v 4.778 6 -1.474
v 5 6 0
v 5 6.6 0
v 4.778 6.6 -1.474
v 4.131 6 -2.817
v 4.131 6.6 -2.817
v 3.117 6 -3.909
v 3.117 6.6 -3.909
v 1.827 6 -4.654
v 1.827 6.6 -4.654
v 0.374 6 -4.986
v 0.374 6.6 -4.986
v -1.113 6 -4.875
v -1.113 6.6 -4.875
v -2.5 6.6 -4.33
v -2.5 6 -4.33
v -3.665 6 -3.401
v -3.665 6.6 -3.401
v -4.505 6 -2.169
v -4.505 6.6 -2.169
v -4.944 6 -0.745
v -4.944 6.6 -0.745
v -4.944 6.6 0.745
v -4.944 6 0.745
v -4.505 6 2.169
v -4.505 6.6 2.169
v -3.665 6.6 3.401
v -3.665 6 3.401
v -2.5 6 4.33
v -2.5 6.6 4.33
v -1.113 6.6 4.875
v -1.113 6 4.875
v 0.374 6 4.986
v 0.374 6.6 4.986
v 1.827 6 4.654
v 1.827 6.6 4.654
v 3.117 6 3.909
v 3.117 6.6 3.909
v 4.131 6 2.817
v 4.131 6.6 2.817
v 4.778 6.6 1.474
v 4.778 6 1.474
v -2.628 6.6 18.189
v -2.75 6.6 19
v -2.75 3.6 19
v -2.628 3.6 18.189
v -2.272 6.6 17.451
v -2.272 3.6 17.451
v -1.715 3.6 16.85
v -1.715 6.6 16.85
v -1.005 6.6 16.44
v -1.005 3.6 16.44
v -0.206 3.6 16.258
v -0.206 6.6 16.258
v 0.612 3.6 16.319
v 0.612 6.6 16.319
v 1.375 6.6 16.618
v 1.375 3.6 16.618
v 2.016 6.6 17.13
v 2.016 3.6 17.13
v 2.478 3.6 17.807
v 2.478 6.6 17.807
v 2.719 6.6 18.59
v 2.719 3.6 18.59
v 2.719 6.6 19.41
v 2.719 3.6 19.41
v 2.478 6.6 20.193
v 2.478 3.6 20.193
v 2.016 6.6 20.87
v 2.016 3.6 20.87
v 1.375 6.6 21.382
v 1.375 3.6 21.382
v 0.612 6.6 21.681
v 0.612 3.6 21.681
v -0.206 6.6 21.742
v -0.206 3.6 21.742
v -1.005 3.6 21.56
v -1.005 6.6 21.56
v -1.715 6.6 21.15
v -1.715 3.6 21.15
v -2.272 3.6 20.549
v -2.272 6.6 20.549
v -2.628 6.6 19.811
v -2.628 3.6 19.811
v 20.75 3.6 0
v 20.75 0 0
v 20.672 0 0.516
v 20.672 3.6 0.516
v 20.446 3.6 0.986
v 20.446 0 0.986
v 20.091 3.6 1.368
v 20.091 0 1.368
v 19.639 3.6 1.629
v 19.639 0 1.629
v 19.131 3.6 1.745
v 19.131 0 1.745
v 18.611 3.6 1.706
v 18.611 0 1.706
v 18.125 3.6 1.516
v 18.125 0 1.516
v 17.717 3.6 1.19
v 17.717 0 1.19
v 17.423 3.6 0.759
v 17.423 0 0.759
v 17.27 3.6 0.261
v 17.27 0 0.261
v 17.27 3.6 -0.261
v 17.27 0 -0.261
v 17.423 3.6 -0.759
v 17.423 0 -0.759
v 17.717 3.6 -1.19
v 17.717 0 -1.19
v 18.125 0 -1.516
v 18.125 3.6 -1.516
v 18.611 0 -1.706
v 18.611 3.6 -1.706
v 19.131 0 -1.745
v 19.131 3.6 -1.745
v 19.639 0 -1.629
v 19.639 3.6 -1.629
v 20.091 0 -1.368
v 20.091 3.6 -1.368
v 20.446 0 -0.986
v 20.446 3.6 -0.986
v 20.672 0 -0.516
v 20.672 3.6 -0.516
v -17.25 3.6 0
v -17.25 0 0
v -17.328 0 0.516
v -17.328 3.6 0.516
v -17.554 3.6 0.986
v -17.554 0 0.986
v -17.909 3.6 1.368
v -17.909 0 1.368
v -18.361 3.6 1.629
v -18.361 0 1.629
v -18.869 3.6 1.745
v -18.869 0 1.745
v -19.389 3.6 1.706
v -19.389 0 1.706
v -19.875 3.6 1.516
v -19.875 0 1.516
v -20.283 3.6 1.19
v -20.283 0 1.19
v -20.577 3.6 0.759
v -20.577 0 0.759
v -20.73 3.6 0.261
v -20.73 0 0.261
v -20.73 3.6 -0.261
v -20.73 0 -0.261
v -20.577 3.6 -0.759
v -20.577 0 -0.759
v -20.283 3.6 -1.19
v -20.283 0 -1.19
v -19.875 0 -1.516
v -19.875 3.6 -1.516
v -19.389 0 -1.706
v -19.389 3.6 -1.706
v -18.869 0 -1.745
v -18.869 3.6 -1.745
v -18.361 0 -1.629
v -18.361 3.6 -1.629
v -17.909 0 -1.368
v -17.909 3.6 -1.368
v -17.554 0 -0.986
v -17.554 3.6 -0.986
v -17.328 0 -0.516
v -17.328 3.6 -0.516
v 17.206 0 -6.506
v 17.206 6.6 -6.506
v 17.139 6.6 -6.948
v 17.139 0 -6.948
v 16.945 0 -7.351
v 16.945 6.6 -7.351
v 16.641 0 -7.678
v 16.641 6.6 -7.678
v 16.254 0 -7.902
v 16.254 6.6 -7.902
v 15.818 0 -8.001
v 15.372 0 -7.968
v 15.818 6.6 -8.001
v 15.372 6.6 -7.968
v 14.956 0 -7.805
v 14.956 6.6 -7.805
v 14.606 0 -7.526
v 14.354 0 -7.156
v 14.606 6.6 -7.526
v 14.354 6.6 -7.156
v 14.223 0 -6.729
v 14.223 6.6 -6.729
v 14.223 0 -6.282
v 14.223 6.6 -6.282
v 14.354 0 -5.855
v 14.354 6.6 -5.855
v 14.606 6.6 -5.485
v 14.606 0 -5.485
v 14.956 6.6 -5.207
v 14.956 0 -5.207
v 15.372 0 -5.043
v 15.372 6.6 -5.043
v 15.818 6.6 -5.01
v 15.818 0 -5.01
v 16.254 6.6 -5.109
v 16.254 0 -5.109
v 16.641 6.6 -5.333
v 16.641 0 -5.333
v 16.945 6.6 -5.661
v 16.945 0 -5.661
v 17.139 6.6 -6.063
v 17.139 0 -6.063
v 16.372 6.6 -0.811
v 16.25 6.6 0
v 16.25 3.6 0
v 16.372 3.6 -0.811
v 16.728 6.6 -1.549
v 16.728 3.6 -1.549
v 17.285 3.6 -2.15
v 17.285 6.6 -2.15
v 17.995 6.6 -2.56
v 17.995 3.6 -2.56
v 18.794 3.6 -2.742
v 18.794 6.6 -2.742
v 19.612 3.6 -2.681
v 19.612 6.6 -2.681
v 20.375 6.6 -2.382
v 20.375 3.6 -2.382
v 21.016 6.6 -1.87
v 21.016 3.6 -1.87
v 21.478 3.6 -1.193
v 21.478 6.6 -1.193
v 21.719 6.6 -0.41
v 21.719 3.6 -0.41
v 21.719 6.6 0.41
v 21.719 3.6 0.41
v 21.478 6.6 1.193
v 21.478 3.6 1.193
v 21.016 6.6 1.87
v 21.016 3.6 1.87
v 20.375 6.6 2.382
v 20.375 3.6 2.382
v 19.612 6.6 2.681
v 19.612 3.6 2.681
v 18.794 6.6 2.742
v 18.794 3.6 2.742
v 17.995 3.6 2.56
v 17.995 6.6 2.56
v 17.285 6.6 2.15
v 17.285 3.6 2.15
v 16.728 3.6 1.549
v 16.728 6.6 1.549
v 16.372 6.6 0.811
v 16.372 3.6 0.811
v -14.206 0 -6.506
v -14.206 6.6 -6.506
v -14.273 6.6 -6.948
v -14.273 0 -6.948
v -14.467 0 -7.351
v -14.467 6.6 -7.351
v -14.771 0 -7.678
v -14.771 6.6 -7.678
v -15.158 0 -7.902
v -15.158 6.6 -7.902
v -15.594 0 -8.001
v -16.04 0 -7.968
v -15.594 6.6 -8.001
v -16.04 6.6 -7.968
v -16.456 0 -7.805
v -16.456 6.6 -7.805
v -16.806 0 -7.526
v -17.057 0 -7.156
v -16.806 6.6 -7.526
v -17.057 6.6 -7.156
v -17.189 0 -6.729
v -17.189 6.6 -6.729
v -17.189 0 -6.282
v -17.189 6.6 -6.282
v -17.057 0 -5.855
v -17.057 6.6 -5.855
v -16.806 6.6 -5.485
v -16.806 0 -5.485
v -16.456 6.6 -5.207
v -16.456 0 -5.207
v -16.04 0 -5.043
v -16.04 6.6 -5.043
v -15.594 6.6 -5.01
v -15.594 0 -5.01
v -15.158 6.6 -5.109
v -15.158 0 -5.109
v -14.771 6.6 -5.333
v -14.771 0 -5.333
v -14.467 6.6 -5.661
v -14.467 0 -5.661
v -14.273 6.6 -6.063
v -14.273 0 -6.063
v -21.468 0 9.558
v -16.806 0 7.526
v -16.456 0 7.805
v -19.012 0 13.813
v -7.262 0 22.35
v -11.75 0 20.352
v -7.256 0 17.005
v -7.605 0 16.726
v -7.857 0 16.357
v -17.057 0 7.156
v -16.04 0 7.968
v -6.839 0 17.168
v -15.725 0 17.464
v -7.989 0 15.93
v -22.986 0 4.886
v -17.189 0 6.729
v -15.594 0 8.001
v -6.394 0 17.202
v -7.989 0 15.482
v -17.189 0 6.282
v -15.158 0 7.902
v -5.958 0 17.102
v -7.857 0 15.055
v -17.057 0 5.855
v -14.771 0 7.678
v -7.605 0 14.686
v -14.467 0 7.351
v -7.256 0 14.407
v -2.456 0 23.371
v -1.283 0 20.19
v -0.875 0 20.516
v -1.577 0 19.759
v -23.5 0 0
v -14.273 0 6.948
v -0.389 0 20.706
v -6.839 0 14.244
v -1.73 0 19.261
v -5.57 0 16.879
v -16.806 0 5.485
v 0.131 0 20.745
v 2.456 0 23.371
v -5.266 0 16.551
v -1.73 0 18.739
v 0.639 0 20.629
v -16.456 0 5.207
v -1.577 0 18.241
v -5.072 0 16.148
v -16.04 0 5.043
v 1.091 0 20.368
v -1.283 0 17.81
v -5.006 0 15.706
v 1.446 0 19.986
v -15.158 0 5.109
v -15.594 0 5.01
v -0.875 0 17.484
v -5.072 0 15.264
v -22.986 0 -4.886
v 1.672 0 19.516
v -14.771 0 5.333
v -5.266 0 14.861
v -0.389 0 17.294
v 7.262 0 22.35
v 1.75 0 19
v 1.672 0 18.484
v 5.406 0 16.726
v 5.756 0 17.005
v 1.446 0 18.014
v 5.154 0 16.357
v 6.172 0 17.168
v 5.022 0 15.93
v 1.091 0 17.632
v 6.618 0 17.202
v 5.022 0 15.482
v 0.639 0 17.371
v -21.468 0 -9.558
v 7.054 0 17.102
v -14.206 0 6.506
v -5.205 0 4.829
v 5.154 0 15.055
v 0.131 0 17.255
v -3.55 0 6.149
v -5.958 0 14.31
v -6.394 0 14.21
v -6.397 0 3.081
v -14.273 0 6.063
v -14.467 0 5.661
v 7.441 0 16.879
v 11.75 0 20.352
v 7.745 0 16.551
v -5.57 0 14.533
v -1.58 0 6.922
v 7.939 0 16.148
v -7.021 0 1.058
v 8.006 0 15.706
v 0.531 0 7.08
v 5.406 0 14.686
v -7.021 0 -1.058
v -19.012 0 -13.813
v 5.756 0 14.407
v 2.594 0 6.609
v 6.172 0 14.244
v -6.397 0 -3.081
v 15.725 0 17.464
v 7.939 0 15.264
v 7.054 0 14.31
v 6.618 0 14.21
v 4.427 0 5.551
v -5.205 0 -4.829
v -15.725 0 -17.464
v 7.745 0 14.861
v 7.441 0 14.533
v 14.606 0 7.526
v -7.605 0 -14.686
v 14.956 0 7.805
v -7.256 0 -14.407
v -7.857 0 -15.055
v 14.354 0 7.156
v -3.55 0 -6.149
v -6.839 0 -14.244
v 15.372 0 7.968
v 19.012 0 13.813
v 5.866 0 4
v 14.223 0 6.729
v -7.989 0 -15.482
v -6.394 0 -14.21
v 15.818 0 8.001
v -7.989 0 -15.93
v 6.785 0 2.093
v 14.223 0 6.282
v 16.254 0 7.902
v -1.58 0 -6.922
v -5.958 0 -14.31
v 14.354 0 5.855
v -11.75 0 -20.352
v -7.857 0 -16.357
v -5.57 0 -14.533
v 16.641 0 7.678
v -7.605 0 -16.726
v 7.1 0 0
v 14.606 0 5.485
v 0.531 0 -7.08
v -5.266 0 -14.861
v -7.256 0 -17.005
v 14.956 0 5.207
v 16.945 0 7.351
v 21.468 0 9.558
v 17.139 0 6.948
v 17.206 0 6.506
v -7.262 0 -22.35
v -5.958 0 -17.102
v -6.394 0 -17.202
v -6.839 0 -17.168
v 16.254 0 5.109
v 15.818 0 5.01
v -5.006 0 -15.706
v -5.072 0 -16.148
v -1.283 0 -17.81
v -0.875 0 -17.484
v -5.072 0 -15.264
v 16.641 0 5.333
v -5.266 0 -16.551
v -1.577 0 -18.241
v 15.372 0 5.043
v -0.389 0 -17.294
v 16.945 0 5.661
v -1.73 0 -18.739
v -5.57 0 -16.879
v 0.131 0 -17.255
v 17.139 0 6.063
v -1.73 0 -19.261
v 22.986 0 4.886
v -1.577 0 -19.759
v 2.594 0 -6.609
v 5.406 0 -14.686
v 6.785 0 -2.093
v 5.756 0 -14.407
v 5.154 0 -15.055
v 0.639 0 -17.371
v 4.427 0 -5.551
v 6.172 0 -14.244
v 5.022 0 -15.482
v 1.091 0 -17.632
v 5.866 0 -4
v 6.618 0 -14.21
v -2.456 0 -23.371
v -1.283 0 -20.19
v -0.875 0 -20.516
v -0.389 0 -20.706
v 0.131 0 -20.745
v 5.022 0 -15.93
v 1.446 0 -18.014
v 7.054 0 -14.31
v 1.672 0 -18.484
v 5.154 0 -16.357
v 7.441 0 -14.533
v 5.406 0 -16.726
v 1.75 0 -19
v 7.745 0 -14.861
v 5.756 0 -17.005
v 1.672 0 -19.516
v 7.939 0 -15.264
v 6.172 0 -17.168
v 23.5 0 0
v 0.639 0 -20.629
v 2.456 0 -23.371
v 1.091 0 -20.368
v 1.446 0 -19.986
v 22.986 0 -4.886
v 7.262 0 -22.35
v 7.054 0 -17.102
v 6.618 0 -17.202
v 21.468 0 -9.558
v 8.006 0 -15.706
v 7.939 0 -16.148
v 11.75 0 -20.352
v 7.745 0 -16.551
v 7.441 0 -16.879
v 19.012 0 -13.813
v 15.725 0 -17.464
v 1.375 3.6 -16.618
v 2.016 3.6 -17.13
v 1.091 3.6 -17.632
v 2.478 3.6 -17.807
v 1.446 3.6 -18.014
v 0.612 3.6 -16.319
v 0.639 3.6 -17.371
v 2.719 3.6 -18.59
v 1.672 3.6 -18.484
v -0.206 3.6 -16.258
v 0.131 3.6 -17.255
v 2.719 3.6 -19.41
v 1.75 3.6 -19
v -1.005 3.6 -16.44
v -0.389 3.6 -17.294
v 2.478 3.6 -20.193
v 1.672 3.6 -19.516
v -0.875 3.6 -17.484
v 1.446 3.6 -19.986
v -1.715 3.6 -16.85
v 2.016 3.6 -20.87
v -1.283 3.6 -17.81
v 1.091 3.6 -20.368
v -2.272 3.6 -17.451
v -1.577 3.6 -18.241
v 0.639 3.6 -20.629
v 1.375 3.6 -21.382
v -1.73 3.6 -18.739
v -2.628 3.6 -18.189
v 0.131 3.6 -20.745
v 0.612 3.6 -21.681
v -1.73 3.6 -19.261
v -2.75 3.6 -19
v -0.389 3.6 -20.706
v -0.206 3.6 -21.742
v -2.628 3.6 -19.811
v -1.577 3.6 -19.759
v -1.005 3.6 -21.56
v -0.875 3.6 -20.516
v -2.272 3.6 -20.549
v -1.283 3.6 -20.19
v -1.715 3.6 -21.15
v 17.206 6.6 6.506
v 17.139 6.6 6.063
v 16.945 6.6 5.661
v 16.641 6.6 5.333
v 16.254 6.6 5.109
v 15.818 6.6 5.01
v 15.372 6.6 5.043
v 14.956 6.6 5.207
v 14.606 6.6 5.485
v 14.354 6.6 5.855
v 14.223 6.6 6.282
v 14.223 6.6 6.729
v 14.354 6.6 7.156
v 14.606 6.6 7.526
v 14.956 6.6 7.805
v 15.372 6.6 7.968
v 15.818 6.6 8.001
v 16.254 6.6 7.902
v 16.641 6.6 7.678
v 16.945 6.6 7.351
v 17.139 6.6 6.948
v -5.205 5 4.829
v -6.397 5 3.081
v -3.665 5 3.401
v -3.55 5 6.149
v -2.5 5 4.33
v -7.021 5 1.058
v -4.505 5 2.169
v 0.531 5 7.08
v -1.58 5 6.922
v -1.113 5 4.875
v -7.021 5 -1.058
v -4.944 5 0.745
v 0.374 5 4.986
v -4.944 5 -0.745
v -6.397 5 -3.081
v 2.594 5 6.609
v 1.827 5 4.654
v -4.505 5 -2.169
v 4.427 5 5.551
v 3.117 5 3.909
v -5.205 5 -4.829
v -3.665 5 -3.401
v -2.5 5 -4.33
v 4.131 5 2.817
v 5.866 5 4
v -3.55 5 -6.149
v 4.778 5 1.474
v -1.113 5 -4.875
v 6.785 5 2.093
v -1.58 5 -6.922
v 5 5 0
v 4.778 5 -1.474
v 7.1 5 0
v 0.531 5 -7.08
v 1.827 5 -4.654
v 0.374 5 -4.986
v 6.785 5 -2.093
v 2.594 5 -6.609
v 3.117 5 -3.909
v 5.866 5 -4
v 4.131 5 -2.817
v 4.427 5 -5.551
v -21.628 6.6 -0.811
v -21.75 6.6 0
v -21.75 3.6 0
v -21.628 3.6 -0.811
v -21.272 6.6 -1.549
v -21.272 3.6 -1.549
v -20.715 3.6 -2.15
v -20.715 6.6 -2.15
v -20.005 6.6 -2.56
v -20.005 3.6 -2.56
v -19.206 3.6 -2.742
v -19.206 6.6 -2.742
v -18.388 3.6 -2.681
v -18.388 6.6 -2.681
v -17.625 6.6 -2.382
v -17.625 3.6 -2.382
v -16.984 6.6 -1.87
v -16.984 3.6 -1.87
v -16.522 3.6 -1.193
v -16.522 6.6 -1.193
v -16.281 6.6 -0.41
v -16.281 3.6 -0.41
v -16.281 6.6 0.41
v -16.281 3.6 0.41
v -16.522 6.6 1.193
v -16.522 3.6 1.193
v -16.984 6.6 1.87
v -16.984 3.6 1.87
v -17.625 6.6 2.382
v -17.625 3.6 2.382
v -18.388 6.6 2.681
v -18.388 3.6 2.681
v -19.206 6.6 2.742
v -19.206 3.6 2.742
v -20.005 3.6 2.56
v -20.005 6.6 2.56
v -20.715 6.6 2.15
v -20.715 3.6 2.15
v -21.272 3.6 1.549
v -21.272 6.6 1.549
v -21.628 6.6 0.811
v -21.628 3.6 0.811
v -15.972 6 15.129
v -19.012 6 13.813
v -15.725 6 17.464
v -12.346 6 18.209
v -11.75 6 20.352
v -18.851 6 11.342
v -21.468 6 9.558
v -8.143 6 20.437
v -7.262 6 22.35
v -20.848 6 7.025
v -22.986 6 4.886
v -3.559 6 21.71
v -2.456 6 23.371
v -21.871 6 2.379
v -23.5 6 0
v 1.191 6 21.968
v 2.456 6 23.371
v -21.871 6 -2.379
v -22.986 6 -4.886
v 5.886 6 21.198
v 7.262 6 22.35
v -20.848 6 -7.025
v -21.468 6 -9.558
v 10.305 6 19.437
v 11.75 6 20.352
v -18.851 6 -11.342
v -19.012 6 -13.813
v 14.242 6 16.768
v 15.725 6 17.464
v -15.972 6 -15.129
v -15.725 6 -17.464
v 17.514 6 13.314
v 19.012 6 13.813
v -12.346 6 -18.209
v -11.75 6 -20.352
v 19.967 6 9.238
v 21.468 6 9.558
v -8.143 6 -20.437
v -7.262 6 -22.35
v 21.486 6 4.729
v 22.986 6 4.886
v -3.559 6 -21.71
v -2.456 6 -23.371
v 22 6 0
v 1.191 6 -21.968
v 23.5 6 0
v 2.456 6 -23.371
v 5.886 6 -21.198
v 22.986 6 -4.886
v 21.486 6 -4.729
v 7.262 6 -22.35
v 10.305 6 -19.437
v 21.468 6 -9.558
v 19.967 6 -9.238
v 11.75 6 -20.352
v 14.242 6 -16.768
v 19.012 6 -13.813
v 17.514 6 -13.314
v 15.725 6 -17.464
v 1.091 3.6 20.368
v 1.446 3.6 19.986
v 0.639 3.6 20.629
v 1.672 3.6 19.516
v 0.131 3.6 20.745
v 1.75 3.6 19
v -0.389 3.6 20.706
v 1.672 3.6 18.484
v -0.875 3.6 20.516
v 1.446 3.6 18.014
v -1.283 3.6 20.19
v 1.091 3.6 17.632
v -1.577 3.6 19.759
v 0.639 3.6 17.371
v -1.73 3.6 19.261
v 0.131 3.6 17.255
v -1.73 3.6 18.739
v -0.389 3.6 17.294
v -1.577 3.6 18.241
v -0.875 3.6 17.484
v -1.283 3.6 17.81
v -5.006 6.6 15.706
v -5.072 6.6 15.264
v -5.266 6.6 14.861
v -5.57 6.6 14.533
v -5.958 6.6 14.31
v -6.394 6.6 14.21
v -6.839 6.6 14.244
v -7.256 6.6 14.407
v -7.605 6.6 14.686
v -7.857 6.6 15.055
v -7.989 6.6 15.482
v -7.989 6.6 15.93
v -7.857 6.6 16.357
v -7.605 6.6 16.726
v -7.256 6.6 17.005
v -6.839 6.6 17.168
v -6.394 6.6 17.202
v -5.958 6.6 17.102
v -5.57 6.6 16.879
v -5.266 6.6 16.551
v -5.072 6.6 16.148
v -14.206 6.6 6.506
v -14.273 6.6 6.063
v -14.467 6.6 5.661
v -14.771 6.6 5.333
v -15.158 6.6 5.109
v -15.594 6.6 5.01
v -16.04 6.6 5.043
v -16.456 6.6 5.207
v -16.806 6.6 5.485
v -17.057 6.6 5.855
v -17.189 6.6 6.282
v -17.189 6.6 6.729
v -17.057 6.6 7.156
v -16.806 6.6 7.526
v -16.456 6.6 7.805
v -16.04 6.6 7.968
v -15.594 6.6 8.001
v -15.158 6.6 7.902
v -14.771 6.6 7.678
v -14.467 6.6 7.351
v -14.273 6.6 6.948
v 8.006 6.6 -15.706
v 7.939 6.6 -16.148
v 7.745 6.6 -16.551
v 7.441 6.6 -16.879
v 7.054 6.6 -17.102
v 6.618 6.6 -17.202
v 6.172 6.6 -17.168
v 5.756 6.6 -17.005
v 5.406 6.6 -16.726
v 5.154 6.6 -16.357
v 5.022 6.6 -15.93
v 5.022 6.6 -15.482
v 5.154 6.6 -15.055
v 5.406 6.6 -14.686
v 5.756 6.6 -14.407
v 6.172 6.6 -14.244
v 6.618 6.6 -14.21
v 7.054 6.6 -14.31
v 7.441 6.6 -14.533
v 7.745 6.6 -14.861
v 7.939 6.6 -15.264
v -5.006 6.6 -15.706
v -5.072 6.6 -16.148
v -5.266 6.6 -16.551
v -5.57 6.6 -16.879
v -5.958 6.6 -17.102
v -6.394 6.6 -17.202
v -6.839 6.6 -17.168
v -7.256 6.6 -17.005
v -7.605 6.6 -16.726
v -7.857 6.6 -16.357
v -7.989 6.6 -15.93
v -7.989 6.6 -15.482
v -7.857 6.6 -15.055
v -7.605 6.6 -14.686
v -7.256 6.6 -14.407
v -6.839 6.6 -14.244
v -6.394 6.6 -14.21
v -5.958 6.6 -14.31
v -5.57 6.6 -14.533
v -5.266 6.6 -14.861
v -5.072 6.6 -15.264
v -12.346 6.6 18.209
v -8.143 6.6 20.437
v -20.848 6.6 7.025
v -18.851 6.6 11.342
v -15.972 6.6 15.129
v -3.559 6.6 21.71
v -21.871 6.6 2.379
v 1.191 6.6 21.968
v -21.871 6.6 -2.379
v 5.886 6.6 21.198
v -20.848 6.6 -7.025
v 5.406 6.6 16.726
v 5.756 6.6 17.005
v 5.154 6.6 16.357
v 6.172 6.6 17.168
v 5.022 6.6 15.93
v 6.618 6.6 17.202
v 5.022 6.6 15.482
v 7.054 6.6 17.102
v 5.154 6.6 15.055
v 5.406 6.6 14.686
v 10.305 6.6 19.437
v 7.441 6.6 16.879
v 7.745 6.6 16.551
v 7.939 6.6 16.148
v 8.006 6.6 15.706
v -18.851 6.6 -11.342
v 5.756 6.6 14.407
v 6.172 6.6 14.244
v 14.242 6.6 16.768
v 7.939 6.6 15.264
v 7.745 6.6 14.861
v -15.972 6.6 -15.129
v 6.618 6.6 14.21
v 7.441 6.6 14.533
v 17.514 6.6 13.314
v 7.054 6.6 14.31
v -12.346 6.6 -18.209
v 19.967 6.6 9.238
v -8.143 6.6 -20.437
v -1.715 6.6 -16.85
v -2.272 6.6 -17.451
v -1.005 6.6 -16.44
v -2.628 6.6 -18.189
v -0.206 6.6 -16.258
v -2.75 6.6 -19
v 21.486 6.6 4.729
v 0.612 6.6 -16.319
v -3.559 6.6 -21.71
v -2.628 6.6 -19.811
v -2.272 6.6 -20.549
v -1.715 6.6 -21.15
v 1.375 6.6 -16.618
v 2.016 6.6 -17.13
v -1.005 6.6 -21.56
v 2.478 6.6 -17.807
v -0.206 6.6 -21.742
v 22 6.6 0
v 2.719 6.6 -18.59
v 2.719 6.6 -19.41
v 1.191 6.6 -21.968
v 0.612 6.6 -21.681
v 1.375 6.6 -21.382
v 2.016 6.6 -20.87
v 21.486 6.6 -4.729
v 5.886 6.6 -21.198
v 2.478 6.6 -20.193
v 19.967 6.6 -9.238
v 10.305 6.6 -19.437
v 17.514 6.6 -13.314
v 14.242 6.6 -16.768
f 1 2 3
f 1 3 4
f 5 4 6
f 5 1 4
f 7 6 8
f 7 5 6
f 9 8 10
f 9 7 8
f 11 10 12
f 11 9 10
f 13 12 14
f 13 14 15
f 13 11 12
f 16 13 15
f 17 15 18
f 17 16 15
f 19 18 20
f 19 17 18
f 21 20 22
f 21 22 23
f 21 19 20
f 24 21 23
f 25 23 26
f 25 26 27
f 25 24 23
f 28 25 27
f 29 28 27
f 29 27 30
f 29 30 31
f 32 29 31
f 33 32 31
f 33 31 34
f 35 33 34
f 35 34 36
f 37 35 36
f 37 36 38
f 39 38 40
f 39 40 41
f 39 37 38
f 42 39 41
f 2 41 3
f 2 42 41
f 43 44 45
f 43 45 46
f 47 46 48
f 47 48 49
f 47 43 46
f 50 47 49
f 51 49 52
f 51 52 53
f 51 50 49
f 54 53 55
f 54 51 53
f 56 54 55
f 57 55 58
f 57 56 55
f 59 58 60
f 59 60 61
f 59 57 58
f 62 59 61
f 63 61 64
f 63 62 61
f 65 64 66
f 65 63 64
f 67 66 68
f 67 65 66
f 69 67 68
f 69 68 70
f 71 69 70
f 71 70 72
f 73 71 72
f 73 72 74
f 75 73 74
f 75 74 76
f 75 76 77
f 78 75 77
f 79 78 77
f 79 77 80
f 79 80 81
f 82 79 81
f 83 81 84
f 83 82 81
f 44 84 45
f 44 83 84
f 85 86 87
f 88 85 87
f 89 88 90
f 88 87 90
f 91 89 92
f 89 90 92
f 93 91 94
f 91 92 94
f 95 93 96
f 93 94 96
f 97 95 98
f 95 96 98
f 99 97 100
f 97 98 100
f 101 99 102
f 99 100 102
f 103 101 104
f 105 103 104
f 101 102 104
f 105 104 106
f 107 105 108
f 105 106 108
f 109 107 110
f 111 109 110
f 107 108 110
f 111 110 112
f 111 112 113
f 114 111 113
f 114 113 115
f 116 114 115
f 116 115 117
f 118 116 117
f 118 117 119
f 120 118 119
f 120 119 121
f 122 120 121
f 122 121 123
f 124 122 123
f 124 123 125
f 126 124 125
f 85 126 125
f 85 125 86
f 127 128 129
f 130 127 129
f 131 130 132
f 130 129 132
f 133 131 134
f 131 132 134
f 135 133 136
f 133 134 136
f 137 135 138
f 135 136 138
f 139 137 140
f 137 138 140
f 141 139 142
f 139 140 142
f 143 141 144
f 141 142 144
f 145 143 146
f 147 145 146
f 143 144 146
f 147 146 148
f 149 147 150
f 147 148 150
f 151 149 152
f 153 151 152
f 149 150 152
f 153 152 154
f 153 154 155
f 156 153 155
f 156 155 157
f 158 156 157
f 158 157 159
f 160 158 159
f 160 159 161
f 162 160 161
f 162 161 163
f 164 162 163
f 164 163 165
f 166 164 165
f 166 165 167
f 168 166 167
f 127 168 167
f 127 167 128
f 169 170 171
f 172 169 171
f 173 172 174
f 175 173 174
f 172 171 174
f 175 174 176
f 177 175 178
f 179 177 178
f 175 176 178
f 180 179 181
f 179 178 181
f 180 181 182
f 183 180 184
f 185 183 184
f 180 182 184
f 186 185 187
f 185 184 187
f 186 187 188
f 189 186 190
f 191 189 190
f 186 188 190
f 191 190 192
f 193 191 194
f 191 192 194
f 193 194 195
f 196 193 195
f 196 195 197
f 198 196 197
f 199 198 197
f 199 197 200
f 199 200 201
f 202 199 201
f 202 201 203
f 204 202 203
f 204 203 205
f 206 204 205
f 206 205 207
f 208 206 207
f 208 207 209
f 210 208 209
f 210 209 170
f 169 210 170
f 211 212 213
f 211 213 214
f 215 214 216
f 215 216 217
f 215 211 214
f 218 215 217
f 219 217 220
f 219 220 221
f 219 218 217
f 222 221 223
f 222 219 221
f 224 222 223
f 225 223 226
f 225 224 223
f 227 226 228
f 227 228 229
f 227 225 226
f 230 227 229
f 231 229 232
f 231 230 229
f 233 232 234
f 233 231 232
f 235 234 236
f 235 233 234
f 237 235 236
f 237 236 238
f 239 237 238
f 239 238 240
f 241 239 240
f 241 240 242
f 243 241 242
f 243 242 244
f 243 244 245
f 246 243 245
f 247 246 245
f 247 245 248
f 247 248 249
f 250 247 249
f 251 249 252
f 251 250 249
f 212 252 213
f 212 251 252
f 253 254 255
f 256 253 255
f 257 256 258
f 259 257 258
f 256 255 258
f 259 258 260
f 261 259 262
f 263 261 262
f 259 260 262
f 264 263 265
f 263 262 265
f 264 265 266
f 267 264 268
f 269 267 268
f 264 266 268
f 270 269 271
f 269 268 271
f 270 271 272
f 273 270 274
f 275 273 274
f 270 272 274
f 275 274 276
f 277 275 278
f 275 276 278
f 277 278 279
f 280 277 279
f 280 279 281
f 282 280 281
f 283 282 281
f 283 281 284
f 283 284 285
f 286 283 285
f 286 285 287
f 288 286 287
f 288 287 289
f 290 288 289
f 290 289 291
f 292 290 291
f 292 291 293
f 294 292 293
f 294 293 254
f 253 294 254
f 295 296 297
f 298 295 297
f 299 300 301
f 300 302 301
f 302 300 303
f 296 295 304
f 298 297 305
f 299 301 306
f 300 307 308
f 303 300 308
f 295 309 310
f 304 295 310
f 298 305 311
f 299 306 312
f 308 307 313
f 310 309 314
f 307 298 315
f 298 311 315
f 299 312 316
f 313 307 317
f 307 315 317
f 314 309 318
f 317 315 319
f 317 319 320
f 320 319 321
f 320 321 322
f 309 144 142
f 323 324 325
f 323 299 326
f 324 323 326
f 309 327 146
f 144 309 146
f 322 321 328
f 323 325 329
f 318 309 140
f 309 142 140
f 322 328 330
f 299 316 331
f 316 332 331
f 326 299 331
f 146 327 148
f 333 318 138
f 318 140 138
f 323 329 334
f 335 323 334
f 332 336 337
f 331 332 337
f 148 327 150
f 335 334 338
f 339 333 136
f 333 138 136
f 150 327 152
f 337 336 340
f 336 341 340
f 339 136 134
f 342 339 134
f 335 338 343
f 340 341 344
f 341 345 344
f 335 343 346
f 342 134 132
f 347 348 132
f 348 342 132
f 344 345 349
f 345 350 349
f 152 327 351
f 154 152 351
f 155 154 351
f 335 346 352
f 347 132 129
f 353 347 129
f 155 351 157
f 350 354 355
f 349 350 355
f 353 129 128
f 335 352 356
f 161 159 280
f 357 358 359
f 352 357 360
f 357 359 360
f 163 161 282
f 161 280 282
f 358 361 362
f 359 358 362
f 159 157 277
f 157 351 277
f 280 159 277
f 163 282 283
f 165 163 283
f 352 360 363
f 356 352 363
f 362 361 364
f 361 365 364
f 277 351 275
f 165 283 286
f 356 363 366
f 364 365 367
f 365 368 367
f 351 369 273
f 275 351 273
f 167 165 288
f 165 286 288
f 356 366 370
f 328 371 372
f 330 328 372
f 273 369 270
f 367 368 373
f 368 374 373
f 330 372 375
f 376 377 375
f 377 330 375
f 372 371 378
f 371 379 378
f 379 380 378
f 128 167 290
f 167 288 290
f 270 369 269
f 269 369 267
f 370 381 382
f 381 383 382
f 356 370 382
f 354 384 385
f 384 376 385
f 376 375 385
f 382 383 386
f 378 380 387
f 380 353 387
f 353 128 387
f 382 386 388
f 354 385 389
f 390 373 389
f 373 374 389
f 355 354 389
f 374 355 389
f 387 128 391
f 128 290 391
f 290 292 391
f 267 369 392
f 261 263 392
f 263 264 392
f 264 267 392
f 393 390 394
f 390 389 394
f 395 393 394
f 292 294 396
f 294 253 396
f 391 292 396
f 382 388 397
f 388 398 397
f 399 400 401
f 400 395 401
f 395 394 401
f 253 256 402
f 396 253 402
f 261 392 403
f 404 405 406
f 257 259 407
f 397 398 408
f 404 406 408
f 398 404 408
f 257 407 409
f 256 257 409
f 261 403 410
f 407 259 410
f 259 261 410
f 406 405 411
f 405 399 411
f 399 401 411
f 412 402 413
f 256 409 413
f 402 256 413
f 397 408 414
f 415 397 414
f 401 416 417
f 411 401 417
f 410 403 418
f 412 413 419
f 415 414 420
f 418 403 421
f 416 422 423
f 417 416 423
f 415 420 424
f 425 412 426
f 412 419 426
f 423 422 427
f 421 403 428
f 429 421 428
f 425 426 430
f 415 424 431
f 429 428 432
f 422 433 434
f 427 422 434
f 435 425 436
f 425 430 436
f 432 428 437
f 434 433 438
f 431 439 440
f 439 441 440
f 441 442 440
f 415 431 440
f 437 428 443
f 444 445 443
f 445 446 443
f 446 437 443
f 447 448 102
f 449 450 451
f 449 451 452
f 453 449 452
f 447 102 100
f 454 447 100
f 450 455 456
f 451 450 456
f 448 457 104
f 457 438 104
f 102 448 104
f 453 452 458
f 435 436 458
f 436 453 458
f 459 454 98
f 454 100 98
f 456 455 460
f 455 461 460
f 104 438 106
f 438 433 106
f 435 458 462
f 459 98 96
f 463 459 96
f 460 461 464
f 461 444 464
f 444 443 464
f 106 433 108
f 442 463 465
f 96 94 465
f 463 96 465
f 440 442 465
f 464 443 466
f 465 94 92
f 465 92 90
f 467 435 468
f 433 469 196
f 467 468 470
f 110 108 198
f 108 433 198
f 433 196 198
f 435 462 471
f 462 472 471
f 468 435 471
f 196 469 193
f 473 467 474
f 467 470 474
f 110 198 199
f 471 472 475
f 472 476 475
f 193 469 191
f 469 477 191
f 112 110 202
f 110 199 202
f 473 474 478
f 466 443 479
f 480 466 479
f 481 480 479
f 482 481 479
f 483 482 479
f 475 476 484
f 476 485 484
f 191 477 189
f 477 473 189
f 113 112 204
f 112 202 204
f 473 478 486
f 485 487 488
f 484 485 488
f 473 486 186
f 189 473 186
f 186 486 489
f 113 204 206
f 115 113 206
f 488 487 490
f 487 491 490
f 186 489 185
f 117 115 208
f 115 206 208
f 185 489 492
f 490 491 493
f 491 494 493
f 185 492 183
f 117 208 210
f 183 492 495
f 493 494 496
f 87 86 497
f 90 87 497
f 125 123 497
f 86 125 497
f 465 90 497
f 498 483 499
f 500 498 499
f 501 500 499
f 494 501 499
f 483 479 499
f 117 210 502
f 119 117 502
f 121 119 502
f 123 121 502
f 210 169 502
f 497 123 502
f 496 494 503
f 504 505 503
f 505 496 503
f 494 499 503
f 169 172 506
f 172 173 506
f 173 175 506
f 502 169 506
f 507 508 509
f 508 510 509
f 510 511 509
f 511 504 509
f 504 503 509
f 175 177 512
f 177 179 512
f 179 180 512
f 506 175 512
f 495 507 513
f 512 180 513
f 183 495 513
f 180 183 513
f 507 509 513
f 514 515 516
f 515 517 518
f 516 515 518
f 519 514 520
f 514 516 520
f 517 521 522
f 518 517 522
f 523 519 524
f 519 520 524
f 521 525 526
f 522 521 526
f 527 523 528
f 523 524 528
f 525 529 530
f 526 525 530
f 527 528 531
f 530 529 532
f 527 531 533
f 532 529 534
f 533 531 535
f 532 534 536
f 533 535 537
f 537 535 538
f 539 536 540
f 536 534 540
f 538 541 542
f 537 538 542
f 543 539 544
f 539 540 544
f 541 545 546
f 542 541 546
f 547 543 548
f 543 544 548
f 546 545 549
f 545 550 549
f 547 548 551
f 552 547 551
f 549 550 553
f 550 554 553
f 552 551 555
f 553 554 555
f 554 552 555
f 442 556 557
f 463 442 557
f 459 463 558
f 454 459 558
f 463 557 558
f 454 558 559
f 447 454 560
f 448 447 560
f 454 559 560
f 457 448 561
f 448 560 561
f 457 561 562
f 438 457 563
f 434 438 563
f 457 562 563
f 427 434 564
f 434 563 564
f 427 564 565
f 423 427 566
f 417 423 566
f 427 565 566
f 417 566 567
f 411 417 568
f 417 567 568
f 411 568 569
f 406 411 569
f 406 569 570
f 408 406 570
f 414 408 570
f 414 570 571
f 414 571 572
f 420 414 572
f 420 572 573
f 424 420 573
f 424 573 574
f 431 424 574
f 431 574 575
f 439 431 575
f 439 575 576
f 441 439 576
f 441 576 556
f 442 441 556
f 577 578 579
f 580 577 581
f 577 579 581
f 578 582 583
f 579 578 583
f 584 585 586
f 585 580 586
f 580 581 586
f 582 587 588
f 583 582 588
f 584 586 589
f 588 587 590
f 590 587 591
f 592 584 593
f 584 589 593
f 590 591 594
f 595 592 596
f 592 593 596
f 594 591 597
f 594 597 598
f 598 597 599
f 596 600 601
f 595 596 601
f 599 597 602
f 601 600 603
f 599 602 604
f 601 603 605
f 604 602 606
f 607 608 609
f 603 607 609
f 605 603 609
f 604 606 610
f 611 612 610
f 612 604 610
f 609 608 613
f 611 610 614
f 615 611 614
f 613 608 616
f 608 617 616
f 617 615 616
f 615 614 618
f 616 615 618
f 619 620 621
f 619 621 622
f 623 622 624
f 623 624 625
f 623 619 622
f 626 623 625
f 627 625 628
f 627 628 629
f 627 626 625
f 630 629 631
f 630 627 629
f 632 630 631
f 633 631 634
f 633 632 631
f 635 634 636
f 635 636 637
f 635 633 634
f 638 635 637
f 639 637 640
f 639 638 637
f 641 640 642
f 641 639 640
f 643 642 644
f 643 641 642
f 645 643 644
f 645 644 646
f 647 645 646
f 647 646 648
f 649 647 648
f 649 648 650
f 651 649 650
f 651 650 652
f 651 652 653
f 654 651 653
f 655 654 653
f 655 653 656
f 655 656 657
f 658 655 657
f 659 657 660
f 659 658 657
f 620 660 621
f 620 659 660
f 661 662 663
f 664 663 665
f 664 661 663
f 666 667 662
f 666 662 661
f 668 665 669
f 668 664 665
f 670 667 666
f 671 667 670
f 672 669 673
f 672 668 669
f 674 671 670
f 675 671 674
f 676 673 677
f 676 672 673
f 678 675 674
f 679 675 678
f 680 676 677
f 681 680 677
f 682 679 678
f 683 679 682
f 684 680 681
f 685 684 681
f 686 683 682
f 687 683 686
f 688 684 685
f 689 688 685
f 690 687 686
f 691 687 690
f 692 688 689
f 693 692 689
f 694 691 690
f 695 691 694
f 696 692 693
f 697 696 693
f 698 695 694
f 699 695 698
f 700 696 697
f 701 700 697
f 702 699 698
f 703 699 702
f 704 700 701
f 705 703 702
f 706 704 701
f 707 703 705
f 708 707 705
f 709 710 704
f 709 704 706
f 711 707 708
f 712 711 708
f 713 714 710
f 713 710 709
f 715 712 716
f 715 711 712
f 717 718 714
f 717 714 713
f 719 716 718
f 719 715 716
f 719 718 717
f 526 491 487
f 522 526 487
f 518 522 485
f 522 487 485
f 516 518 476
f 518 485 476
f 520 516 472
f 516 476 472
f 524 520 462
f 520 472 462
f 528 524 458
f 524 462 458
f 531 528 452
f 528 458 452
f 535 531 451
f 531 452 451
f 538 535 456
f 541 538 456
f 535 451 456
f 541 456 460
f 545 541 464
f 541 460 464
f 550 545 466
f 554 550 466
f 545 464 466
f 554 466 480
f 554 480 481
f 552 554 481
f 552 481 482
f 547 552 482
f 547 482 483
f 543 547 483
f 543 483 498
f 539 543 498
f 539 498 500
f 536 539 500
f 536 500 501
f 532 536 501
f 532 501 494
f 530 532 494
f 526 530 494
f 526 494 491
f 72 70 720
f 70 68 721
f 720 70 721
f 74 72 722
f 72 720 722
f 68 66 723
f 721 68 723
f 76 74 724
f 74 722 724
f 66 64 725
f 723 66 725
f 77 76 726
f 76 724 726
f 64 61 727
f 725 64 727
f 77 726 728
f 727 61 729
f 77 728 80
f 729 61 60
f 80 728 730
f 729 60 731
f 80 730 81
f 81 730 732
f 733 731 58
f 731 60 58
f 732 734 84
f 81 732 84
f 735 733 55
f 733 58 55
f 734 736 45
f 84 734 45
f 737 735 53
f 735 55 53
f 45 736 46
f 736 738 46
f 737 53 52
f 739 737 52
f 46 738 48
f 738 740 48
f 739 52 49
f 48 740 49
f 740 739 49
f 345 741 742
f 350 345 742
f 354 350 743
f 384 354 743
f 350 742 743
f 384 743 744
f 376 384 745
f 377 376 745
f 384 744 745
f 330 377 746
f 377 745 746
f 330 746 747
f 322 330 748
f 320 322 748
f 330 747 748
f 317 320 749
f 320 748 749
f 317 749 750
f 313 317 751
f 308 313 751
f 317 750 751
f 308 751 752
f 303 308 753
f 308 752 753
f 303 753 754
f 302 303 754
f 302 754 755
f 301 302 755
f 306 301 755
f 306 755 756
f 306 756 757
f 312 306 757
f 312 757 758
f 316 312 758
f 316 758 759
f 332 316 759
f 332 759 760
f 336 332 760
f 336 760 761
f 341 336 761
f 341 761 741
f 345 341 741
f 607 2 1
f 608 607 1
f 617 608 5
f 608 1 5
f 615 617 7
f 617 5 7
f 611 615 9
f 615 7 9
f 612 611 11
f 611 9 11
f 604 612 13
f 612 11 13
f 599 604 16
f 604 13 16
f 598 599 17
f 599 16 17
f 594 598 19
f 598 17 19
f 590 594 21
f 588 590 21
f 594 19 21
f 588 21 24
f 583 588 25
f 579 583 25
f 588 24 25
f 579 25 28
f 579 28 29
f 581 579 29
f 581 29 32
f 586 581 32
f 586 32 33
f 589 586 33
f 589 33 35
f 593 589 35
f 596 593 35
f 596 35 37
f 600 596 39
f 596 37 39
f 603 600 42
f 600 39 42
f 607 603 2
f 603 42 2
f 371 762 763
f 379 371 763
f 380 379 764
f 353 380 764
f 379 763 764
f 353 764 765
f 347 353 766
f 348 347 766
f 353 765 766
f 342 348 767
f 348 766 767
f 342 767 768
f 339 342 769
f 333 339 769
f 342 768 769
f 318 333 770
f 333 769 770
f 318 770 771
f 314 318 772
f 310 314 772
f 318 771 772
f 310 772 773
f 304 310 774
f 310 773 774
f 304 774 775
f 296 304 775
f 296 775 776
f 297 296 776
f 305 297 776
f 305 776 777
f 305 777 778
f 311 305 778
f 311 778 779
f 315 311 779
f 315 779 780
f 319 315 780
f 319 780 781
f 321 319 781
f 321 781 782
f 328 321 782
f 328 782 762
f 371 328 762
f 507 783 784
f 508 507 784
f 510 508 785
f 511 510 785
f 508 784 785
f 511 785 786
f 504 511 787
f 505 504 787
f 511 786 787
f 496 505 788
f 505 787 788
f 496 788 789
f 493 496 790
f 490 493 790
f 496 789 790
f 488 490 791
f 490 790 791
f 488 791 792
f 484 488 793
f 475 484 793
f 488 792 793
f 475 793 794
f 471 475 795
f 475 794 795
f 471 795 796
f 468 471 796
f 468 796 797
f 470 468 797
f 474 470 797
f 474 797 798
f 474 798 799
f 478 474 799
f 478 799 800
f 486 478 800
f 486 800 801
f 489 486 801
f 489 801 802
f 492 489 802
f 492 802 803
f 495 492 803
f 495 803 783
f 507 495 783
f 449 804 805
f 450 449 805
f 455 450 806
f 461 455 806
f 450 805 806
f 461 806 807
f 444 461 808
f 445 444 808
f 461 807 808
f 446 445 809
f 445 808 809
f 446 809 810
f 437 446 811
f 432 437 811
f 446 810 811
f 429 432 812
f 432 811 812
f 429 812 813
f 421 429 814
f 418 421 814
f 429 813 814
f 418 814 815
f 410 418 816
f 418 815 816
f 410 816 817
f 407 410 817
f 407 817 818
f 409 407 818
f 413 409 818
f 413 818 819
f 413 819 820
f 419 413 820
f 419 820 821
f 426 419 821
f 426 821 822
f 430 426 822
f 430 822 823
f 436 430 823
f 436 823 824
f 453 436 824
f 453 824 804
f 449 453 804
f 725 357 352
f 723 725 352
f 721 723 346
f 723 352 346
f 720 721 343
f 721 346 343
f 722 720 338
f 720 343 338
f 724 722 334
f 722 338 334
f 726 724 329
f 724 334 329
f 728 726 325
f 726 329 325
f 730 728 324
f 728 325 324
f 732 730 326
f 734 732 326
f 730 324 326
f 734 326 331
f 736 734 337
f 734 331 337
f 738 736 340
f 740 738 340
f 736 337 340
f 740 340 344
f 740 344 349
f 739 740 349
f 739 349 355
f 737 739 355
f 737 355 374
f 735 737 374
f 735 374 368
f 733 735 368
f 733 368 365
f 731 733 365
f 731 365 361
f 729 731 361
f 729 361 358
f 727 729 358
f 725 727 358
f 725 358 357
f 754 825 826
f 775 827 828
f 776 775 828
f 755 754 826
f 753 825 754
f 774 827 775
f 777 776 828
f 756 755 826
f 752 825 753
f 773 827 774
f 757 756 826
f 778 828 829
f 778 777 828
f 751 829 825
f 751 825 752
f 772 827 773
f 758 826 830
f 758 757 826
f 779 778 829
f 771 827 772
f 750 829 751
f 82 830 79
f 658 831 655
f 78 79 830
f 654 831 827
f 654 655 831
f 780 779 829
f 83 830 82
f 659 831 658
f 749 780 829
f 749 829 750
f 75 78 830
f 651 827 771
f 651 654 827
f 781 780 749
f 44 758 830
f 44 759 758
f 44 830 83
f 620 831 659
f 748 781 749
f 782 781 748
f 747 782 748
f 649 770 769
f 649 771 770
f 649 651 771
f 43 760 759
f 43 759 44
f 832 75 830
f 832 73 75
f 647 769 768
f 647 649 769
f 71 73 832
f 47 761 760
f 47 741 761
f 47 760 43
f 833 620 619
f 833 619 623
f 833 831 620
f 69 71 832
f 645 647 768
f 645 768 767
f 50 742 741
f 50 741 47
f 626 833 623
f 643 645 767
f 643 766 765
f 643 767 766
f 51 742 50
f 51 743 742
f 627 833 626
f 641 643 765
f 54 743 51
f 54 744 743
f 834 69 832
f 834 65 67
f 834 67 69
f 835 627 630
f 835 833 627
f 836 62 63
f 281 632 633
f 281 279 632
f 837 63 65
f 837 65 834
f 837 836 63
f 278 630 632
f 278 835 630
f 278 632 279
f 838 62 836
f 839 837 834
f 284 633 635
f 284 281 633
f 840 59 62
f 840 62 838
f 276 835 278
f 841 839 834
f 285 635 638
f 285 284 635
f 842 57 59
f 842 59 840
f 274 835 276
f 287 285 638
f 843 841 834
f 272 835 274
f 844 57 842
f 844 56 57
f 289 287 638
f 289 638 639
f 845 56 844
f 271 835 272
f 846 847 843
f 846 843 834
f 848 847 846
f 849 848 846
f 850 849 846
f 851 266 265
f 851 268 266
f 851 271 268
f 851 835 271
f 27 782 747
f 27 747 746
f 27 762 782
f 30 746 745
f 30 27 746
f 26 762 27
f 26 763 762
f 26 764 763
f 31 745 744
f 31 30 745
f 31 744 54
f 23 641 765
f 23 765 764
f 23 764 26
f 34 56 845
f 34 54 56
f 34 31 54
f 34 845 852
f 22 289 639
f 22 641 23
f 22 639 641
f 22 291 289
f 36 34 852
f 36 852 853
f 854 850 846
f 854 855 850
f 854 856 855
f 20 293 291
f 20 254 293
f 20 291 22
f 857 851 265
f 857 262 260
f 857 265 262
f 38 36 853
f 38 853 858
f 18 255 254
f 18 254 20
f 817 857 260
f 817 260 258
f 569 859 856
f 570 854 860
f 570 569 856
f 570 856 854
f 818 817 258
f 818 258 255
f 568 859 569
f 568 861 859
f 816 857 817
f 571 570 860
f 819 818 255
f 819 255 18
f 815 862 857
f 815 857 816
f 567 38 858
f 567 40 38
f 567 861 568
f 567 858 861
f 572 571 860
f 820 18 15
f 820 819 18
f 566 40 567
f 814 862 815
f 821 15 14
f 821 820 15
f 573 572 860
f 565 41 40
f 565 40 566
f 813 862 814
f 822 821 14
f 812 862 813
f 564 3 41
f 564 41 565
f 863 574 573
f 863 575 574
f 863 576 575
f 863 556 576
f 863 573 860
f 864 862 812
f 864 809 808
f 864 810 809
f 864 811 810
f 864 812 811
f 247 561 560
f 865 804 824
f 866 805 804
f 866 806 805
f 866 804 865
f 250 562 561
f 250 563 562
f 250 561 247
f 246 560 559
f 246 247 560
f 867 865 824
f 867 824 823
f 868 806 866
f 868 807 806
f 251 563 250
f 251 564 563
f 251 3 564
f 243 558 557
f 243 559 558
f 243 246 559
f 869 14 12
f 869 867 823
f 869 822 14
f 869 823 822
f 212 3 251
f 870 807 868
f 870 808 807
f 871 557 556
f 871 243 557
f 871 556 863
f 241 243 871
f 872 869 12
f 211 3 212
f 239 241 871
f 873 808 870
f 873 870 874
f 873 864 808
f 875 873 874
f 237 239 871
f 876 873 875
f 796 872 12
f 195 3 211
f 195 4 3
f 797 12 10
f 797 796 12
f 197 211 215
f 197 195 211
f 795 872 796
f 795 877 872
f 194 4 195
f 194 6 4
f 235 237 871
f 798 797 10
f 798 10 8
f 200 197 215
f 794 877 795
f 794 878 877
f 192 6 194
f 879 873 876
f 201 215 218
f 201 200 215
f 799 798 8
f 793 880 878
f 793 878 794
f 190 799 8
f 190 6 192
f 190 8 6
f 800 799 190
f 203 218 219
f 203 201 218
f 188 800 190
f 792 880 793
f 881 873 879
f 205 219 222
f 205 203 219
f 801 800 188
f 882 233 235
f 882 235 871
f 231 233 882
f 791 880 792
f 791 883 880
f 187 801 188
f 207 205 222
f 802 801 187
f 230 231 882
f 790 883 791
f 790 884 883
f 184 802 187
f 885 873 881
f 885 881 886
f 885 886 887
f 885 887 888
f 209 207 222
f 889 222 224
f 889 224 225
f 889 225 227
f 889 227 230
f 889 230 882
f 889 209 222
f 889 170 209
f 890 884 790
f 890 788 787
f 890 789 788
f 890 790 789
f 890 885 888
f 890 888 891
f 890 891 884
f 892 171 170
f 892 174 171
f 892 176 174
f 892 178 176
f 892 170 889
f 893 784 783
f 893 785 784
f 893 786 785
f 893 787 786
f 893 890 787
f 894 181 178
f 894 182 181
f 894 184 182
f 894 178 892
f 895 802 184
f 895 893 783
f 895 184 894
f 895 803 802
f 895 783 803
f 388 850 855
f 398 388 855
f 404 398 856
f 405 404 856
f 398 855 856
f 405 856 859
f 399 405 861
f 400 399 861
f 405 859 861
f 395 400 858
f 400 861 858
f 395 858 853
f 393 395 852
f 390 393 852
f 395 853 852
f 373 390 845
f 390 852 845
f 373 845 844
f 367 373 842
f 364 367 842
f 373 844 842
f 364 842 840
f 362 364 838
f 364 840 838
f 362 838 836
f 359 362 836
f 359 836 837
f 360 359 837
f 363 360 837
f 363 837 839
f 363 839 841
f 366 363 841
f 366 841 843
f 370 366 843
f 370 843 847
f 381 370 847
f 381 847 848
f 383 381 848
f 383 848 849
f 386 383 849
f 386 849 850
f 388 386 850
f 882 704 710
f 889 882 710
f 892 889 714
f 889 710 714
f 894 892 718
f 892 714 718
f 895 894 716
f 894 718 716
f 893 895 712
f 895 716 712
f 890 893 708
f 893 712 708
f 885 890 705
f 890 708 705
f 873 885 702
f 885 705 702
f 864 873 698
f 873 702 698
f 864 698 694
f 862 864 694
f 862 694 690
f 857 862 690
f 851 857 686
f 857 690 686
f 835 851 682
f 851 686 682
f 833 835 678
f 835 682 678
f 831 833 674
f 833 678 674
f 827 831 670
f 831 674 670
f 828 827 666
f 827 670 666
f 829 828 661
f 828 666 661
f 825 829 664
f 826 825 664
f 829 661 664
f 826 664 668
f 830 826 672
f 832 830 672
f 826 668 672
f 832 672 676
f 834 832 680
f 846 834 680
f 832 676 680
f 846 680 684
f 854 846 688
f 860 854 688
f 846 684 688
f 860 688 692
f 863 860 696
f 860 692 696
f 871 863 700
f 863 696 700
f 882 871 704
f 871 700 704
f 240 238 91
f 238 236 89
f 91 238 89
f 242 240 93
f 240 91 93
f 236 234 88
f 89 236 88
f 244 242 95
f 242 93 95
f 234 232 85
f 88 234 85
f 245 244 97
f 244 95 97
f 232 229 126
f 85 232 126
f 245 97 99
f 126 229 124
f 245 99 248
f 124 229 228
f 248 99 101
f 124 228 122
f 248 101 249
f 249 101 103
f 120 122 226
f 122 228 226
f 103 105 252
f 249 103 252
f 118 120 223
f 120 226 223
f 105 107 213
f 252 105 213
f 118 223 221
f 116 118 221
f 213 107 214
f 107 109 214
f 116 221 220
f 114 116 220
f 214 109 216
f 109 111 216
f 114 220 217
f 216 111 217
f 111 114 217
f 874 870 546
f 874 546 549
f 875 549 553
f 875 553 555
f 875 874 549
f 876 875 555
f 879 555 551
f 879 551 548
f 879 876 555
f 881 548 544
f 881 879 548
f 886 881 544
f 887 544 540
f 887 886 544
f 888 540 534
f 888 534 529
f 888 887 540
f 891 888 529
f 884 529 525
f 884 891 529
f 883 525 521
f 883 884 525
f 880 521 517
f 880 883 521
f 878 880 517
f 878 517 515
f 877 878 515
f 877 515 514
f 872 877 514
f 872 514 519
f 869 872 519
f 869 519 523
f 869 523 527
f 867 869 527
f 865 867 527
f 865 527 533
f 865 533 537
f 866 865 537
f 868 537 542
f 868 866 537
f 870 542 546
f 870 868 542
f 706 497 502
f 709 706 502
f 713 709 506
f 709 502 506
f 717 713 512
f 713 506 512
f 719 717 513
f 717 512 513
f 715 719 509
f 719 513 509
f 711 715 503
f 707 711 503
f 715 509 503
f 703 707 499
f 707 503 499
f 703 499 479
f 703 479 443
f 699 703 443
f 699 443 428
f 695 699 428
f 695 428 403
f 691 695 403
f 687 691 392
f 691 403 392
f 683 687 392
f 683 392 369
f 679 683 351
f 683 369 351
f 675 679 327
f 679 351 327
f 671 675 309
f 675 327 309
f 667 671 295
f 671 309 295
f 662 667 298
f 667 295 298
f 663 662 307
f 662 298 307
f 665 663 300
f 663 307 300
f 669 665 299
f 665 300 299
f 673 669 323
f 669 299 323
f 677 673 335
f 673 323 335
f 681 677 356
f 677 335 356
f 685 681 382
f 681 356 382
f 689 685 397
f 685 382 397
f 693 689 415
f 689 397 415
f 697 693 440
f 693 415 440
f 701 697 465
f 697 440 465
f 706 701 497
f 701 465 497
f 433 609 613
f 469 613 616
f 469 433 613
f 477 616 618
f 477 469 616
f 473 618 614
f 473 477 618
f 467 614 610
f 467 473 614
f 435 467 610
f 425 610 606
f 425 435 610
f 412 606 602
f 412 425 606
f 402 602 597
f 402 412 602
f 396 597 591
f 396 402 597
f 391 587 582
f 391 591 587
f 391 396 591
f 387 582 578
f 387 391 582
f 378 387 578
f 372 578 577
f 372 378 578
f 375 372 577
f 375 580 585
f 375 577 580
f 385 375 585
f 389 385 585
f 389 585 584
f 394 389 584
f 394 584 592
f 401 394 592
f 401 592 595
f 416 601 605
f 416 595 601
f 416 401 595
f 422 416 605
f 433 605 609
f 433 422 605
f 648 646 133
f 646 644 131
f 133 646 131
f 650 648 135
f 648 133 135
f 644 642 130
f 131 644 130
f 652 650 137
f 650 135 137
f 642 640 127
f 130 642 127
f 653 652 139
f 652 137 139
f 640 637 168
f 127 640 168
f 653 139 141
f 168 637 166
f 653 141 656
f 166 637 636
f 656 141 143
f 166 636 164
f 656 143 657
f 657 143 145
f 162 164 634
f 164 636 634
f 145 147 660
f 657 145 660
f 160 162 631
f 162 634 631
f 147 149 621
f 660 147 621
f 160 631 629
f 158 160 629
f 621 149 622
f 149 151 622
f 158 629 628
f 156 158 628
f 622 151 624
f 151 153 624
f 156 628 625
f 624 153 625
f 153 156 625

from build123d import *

# Parameters (mm, degrees)
SKETCH1_R                = 23.5
SKETCH1_R_2              = 7.1
BOSS_EXTRUDE1_DEPTH      = 6
SKETCH2_R                = 22
SKETCH2_R_2              = 5
BOSS_EXTRUDE2_DEPTH      = 0.6
BOSS_EXTRUDE2_DEPTH_BACK = 1
SKETCH3_R                = 1.75
CUT_EXTRUDE1_DEPTH       = 7.6
CUT_EXTRUDE2_START       = -6.6
SKETCH4_R                = 2.75
SKETCH4_R_2              = 1.75
CUT_EXTRUDE2_DEPTH       = 3
SKETCH5_R                = 1.5
CUT_EXTRUDE3_DEPTH       = 7.6


with BuildPart() as part:
    # Sketch1 → Boss-Extrude1 (new body)
    with BuildSketch(Plane(origin=(0, 0, 0), x_dir=(1, 0, 0), z_dir=(0, 1, 0))):
        Circle(SKETCH1_R)
        Circle(SKETCH1_R_2, mode=Mode.SUBTRACT)
    extrude(amount=BOSS_EXTRUDE1_DEPTH)

    # Sketch2 → Boss-Extrude2 (add, two sides)
    with BuildSketch(Plane(origin=(0, 6, 0), x_dir=(1, 0, 0), z_dir=(0, 1, 0))) as boss_extrude2_sk:
        Circle(SKETCH2_R)
        Circle(SKETCH2_R_2, mode=Mode.SUBTRACT)
    extrude(amount=BOSS_EXTRUDE2_DEPTH)
    extrude(boss_extrude2_sk.sketch, amount=-BOSS_EXTRUDE2_DEPTH_BACK)

    # Sketch3 → Cut-Extrude1 (cut, through all)
    with BuildSketch(Plane.XZ):
        with Locations((0, 19)):
            Circle(SKETCH3_R)
        with Locations((19, 0)):
            Circle(SKETCH3_R)
        with Locations((0, -19)):
            Circle(SKETCH3_R)
        with Locations((-19, 0)):
            Circle(SKETCH3_R)
    extrude(amount=-CUT_EXTRUDE1_DEPTH, mode=Mode.SUBTRACT)

    # Sketch4 → Cut-Extrude2 (cut)
    with BuildSketch(Plane(origin=(0, 0, 0), x_dir=(-1, 0, 0), z_dir=(0, -1, 0)).offset(CUT_EXTRUDE2_START)):
        with Locations((0, 19)):
            Circle(SKETCH4_R)
        with Locations((0, 19)):
            Circle(SKETCH4_R_2, mode=Mode.SUBTRACT)
        with Locations((19, 0)):
            Circle(SKETCH4_R)
        with Locations((19, 0)):
            Circle(SKETCH4_R_2, mode=Mode.SUBTRACT)
        with Locations((-19, 0)):
            Circle(SKETCH4_R)
        with Locations((-19, 0)):
            Circle(SKETCH4_R_2, mode=Mode.SUBTRACT)
        with Locations((0, -19)):
            Circle(SKETCH4_R)
        with Locations((0, -19)):
            Circle(SKETCH4_R_2, mode=Mode.SUBTRACT)
    extrude(amount=CUT_EXTRUDE2_DEPTH, mode=Mode.SUBTRACT)

    # Sketch5 → Cut-Extrude3 (cut, through all)
    with BuildSketch(Plane(origin=(0, 6.6, 0), x_dir=(1, 0, 0), z_dir=(0, 1, 0))):
        with Locations((-6.50561835, 15.705952053)):
            Circle(SKETCH5_R)
        with Locations((6.50561835, 15.705952053)):
            Circle(SKETCH5_R)
        with Locations((15.705952053, 6.50561835)):
            Circle(SKETCH5_R)
        with Locations((15.705952053, -6.50561835)):
            Circle(SKETCH5_R)
        with Locations((6.50561835, -15.705952053)):
            Circle(SKETCH5_R)
        with Locations((-6.50561835, -15.705952053)):
            Circle(SKETCH5_R)
        with Locations((-15.705952053, -6.50561835)):
            Circle(SKETCH5_R)
        with Locations((-15.705952053, 6.50561835)):
            Circle(SKETCH5_R)
    extrude(amount=-CUT_EXTRUDE3_DEPTH, mode=Mode.SUBTRACT)


solid = part.part
